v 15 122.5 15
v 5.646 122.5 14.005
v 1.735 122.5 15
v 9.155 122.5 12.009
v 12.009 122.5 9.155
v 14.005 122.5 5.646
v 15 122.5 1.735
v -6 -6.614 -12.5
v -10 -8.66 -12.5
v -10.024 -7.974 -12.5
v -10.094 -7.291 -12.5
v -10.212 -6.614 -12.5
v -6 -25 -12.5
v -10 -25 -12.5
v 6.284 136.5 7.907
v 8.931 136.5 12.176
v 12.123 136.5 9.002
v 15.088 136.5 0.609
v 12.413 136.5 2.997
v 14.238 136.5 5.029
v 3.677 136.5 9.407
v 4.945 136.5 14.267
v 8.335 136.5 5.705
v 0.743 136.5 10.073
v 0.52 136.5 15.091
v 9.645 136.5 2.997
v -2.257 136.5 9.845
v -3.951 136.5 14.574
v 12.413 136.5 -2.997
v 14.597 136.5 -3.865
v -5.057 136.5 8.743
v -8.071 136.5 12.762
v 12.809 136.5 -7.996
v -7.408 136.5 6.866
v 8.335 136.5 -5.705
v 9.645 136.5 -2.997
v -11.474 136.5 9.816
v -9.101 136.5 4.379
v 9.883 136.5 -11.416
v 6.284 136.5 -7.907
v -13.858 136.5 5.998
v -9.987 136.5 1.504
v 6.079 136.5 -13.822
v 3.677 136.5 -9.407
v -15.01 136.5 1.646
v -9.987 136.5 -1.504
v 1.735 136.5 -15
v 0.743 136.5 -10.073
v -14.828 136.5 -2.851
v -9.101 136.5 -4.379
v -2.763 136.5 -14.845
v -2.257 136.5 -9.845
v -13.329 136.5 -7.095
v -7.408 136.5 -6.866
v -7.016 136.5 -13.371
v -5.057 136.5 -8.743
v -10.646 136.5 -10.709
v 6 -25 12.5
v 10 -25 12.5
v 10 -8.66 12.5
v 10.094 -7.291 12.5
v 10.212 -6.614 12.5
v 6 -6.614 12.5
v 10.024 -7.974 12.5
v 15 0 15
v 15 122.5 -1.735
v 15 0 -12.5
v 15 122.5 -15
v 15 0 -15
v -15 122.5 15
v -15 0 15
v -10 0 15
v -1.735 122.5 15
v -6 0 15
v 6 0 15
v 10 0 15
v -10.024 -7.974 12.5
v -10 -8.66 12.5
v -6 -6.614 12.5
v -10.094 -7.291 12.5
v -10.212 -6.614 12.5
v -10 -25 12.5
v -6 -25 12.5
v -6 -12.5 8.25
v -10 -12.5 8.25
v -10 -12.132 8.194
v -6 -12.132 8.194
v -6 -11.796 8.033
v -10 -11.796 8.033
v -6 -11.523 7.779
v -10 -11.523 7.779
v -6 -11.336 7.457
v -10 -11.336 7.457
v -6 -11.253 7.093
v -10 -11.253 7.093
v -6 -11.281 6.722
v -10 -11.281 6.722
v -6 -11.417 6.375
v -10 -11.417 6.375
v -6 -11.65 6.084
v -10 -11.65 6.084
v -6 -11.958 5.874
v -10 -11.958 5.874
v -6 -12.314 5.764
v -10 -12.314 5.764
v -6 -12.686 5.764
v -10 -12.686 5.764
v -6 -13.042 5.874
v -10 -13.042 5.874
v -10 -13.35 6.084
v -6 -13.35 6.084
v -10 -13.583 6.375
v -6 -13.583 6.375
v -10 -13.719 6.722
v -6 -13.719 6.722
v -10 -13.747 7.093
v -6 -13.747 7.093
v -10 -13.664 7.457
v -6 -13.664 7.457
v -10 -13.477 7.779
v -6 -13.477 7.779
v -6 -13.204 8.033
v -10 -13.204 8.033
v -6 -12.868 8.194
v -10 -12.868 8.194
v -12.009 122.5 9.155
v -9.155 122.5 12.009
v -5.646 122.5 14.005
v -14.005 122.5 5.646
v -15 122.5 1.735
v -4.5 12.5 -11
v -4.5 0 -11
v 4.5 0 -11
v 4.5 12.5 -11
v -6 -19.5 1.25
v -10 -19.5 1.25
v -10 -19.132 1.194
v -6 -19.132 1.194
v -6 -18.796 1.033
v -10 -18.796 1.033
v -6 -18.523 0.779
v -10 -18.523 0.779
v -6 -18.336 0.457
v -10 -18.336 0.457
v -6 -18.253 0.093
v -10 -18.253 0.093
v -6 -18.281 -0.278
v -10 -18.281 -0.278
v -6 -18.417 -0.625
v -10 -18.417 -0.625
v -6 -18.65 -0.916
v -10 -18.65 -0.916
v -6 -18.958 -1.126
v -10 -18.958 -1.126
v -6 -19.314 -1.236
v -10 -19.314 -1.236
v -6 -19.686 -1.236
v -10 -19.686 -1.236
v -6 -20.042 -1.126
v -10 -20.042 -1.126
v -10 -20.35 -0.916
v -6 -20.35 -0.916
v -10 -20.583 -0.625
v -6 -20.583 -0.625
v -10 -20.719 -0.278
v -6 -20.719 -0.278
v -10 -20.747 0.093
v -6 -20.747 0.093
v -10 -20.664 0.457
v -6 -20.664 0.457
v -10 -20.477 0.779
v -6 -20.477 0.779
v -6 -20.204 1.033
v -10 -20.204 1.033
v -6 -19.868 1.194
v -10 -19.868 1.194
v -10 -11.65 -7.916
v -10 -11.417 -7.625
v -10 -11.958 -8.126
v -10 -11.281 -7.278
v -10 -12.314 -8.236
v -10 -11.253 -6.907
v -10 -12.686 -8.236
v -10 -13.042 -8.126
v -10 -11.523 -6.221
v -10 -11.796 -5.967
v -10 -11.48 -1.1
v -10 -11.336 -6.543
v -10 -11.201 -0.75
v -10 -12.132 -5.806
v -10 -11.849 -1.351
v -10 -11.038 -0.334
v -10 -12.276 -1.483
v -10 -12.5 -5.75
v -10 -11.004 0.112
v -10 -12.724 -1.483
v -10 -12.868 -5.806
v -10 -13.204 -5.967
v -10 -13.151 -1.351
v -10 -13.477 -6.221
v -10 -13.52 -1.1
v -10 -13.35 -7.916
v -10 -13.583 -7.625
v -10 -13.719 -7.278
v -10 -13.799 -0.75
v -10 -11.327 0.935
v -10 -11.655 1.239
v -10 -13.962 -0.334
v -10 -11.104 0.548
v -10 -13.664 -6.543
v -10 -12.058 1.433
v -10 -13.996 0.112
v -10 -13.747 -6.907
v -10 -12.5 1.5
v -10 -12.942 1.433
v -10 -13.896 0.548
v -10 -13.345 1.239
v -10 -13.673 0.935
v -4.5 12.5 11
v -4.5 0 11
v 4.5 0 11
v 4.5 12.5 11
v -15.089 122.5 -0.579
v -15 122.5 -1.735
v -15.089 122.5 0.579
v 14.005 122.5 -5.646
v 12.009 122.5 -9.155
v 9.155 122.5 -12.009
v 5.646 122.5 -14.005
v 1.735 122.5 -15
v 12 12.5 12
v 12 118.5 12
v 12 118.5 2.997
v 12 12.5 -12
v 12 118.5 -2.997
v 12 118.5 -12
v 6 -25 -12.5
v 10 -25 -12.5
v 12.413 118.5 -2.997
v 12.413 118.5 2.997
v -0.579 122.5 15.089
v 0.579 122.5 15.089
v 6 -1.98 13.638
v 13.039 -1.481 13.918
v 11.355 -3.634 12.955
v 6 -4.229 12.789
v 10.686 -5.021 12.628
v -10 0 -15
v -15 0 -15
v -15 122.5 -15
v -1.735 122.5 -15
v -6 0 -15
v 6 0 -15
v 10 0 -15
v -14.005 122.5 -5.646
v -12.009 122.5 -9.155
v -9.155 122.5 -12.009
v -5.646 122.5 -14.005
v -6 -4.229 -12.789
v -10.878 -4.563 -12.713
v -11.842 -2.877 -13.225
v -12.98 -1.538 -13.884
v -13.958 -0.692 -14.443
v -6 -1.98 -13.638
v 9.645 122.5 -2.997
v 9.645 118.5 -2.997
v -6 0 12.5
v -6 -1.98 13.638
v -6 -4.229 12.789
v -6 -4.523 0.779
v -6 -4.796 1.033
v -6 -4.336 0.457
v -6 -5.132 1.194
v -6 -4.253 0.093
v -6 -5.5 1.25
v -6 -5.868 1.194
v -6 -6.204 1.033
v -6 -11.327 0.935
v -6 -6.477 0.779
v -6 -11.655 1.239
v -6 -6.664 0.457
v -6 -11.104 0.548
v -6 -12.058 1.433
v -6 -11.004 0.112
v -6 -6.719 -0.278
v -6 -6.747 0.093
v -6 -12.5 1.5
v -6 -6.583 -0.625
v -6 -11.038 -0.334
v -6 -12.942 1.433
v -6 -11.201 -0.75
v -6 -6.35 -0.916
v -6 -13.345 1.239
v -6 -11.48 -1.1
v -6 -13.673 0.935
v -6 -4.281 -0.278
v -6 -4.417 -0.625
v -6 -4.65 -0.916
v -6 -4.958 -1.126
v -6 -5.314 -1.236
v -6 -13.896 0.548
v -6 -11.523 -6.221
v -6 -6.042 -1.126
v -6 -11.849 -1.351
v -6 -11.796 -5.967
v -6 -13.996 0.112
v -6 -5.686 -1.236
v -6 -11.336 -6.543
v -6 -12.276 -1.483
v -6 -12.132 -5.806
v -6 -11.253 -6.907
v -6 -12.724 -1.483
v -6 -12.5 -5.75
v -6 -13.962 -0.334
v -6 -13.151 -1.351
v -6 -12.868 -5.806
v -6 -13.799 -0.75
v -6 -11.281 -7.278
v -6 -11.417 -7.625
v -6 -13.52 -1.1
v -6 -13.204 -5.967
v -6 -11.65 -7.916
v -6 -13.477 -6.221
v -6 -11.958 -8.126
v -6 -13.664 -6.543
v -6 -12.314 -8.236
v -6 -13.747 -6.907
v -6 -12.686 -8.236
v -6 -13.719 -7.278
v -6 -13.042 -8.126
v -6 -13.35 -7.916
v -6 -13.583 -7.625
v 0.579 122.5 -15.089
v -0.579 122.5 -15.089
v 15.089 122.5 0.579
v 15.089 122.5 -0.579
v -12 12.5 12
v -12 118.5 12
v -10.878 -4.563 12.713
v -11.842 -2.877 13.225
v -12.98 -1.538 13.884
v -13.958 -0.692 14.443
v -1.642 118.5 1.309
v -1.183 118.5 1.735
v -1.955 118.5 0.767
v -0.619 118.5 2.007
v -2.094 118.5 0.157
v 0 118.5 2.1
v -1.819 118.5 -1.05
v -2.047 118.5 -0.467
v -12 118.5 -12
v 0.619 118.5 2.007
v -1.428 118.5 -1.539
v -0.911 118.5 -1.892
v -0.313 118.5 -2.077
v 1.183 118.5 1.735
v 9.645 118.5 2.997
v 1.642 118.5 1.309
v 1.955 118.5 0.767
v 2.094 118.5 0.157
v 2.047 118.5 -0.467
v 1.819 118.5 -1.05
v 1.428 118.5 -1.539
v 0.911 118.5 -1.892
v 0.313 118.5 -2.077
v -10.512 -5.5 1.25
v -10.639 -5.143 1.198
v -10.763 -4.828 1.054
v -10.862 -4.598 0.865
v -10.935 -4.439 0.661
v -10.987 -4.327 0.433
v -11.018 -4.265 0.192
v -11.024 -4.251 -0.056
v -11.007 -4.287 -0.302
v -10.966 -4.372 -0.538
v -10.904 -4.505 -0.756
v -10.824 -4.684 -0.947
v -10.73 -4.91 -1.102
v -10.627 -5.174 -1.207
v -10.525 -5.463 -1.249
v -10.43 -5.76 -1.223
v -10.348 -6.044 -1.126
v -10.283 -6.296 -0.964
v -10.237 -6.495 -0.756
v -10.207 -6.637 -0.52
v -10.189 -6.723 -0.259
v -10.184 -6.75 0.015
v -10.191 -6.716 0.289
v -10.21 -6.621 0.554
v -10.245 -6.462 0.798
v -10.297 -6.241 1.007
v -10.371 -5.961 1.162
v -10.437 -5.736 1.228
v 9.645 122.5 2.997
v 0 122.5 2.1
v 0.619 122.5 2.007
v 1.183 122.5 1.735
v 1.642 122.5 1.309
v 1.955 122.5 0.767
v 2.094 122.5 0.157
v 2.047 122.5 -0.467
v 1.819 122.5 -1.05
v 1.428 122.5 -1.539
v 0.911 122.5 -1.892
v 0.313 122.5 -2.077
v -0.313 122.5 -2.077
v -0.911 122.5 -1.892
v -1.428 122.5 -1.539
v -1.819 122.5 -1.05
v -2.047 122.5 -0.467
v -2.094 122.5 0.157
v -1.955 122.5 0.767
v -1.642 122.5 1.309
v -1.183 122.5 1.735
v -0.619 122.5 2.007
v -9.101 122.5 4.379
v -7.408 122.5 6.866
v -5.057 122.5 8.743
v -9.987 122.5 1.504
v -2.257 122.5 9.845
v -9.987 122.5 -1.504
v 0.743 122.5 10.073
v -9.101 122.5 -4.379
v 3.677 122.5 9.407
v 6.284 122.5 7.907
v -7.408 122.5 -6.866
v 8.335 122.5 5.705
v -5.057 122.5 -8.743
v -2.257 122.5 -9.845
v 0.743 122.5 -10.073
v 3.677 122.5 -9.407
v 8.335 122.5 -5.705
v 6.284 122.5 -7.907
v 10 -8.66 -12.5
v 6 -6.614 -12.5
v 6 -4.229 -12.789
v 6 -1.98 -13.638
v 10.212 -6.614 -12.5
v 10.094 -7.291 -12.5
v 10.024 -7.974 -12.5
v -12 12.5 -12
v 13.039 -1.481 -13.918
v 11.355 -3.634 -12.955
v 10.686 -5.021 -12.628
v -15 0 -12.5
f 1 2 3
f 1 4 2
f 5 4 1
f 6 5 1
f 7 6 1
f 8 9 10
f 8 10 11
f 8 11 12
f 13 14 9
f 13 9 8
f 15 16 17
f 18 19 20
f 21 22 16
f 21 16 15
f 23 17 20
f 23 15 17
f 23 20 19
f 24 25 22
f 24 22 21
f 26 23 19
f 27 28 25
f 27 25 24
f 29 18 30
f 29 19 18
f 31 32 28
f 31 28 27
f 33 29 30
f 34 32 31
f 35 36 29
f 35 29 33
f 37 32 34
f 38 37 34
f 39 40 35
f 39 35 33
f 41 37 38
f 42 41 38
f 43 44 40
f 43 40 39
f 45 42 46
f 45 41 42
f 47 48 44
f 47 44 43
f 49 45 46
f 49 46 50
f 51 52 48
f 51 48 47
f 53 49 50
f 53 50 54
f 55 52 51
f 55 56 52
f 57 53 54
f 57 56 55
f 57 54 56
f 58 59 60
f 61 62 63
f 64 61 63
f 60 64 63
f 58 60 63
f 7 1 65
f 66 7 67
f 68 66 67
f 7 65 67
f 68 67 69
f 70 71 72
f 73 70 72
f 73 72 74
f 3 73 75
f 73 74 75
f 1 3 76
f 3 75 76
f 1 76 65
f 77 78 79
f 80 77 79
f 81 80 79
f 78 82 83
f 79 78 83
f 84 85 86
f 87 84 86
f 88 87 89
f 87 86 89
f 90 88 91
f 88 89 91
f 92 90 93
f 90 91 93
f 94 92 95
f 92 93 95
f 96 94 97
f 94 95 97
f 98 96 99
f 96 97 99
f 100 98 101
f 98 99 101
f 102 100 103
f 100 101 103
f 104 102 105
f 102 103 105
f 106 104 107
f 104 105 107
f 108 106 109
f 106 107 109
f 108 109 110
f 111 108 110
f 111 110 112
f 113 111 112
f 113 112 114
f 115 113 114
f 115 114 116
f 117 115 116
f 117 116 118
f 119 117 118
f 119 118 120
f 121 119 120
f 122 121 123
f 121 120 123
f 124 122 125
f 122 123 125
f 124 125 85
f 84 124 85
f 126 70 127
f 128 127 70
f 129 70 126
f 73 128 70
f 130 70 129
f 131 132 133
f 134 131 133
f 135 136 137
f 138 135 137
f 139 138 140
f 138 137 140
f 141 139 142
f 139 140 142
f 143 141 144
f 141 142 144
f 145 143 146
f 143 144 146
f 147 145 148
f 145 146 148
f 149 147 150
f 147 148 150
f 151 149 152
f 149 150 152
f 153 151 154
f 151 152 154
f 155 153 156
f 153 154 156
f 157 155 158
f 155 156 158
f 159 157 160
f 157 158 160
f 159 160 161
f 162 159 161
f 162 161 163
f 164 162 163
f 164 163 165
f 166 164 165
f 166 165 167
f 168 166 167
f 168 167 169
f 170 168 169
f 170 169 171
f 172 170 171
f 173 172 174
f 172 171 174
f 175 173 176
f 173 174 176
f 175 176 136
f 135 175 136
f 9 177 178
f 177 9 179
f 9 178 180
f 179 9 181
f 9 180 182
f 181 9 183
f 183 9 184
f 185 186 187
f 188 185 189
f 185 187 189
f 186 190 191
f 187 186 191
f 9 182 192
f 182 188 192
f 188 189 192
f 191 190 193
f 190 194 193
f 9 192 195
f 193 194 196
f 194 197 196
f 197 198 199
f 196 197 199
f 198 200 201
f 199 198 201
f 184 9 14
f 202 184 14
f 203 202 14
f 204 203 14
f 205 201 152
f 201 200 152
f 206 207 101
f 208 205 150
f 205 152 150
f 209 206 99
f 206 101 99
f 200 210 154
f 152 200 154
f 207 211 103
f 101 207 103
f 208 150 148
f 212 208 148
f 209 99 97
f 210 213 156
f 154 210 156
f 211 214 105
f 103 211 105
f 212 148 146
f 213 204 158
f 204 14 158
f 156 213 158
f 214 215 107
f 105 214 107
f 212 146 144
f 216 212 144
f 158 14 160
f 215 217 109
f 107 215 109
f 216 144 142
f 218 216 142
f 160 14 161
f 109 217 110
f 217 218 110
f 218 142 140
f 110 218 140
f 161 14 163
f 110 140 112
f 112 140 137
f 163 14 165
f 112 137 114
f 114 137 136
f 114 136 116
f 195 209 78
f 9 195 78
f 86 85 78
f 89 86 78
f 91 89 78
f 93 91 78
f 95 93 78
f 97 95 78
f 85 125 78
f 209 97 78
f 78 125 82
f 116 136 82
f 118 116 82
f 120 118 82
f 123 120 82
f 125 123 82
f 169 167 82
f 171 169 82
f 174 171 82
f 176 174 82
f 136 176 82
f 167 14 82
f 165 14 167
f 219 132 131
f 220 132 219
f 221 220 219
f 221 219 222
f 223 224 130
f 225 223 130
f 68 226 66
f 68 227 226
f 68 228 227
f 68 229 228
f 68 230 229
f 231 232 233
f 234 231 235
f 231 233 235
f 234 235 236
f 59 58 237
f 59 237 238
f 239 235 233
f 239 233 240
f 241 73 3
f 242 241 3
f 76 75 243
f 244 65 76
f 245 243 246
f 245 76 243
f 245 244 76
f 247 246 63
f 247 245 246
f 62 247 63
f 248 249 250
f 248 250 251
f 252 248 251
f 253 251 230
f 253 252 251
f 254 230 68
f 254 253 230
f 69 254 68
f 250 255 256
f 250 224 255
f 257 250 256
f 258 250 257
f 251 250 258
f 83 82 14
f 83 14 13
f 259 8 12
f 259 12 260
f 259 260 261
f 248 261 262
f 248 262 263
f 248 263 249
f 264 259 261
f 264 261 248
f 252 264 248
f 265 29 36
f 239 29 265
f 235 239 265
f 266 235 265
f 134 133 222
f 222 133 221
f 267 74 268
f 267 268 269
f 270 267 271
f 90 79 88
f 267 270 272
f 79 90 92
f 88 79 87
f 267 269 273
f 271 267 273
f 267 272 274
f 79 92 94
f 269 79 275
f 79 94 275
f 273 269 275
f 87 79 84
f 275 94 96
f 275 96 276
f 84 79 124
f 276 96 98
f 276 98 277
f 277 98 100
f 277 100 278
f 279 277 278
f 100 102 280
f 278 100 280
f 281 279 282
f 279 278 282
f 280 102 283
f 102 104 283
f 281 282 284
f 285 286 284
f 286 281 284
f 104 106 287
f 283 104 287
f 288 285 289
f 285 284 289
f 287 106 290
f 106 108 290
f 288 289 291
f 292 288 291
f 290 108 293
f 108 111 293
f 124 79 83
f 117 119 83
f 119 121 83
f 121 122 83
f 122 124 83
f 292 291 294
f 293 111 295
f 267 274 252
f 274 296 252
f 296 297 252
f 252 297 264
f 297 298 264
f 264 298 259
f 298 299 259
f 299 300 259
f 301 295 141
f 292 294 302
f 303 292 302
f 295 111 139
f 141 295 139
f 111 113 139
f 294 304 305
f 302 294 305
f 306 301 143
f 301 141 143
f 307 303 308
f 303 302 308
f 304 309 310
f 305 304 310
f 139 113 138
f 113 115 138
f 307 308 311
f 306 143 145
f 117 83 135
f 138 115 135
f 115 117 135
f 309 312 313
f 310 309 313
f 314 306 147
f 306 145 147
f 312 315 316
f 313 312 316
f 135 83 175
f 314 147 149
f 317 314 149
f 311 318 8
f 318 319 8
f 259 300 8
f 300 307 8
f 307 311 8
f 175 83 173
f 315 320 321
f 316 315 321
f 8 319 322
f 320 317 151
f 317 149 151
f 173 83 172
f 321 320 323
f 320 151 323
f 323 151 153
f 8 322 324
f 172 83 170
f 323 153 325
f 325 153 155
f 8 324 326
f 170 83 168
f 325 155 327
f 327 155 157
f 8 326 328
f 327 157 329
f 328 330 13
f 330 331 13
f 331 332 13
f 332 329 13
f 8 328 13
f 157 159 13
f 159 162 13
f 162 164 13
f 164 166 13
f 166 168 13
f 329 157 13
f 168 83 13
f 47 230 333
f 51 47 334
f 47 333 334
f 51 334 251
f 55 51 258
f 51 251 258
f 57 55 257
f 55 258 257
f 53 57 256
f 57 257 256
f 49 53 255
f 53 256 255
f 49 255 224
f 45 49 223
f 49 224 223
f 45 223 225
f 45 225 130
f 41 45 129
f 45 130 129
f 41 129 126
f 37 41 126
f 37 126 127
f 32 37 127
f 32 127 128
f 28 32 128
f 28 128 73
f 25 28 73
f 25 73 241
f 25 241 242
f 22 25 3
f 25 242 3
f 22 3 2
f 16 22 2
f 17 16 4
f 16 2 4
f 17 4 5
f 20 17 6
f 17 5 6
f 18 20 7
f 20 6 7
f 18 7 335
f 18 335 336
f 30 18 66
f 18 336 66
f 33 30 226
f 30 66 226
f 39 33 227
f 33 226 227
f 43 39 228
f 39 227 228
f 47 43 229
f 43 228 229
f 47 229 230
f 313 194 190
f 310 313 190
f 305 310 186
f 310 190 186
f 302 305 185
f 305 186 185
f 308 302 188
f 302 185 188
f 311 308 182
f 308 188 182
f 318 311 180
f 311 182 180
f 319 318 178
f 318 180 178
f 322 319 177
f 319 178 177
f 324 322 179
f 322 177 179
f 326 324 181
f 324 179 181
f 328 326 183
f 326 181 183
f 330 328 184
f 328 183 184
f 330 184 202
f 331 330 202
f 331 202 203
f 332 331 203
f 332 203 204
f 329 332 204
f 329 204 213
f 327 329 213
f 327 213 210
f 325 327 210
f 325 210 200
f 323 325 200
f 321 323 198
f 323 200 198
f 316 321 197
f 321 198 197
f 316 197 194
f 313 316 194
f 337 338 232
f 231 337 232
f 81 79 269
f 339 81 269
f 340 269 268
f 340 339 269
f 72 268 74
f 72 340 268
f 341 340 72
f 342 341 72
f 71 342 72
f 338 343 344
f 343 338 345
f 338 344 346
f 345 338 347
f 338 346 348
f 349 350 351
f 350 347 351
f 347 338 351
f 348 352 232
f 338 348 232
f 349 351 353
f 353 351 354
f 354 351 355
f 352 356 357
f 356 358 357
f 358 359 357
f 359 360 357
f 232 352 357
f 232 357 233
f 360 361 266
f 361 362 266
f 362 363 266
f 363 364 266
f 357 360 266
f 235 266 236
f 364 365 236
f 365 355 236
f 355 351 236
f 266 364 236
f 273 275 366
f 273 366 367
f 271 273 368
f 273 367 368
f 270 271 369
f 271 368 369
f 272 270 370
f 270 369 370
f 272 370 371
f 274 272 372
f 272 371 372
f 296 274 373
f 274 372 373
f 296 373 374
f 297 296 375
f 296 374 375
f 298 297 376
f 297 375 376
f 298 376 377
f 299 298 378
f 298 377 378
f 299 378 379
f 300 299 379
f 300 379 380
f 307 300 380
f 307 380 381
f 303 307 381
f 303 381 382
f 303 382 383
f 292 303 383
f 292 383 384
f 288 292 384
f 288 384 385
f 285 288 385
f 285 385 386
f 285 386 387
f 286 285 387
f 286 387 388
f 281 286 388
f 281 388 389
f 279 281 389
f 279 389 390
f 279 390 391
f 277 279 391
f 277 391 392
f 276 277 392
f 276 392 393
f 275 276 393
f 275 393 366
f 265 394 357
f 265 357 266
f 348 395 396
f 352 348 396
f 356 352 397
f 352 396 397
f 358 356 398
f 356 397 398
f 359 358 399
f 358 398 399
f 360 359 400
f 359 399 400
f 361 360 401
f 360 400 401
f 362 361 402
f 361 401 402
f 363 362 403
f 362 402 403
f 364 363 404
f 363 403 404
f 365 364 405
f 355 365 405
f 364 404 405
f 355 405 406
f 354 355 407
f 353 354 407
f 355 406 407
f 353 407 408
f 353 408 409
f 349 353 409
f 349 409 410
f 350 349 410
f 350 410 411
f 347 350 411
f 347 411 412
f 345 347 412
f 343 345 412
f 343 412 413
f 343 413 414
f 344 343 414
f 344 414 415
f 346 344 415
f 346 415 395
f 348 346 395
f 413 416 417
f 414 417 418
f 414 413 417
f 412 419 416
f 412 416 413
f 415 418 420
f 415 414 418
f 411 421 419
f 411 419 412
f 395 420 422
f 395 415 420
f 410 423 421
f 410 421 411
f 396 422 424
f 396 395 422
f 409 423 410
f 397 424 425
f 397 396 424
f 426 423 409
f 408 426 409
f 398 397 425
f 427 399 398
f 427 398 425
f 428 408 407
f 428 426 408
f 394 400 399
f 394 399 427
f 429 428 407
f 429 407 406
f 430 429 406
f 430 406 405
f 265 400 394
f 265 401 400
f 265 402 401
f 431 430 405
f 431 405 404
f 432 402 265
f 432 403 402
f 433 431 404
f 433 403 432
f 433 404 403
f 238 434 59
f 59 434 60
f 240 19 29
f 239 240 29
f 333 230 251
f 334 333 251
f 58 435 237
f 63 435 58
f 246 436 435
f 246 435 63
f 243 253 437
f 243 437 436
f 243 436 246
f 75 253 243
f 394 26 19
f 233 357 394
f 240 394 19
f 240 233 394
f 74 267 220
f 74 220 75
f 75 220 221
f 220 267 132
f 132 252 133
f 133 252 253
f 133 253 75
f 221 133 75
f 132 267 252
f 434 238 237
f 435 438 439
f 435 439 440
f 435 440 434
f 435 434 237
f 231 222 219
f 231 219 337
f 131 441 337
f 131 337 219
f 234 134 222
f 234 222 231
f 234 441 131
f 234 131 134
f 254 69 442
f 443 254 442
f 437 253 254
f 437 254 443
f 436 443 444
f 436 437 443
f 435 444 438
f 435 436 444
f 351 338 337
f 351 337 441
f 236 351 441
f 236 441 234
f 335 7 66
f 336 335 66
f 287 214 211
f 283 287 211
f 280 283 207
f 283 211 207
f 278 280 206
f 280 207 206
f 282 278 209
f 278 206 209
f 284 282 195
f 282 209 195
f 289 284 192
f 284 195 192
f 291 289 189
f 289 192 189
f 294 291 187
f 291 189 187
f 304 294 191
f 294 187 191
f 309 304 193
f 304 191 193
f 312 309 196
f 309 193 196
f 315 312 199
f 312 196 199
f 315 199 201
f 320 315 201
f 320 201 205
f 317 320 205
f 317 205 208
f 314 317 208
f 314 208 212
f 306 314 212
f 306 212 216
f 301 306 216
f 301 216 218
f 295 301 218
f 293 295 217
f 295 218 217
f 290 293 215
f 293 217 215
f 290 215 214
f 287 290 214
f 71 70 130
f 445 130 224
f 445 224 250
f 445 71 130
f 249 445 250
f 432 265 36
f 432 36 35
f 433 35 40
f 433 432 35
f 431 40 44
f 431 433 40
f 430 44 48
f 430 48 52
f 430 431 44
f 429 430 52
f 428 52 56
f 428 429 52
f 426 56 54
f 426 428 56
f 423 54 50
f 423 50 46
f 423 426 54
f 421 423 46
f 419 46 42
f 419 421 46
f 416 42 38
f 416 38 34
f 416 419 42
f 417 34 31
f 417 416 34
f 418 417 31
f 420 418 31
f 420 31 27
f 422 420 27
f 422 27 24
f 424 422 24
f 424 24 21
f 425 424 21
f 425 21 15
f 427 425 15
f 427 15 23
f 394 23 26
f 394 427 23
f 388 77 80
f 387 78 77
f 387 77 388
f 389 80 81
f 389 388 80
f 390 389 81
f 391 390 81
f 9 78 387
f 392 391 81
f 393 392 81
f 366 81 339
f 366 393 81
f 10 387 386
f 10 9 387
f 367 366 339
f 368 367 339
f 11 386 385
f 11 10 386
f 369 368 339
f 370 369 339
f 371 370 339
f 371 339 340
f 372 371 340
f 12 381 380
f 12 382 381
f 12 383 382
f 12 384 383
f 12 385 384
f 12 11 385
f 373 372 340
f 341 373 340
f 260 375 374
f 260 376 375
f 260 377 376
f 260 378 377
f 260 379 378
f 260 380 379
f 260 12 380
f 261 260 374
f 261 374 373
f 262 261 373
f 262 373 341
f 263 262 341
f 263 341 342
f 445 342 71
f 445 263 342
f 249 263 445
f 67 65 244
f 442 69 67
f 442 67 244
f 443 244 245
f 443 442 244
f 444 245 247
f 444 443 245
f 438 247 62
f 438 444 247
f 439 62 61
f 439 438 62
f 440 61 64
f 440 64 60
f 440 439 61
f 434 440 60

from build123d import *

# Parameters (mm, degrees)
SKETCH1_W           = 30
SKETCH1_H           = 30
BOSS_EXTRUDE1_DEPTH = 122.5
SKETCH2_W           = 4
SKETCH2_H           = 25
BOSS_EXTRUDE2_DEPTH = 25
SKETCH3_W           = 24
SKETCH3_H           = 24
CUT_EXTRUDE1_DEPTH  = 110
SKETCH5_W           = 24
SKETCH5_H           = 24
BOSS_EXTRUDE4_DEPTH = 4
SKETCH4_R           = 15.1
BOSS_EXTRUDE3_DEPTH = 14
SKETCH7_W           = 2.767549144
SKETCH7_H           = 5.993795478
CUT_EXTRUDE3_DEPTH  = 4
SKETCH12_R          = 2.1
CUT_EXTRUDE6_DEPTH  = 150.037813994
SKETCH13_W          = 9
SKETCH13_H          = 22
CUT_EXTRUDE7_DEPTH  = 20
SKETCH8_R           = 1.25
SKETCH8_R_2         = 1.5
CUT_EXTRUDE4_DEPTH  = 4
FILLET1_R           = 10


with BuildPart() as part:
    # Sketch1 → Boss-Extrude1 (new body)
    with BuildSketch(Plane(origin=(0, 0, 0), x_dir=(1, 0, 0), z_dir=(0, 1, 0))):
        Rectangle(SKETCH1_W, SKETCH1_H)
    extrude(amount=BOSS_EXTRUDE1_DEPTH)

    # Sketch2 → Boss-Extrude2 (add)
    with BuildSketch(Plane.XZ):
        with Locations((-8, 0)):
            Rectangle(SKETCH2_W, SKETCH2_H)
        with Locations((8, 0)):
            Rectangle(SKETCH2_W, SKETCH2_H)
    extrude(amount=BOSS_EXTRUDE2_DEPTH)

    # Sketch3 → Cut-Extrude1 (cut)
    with BuildSketch(Plane(origin=(0, 122.5, 0), x_dir=(1, 0, 0), z_dir=(0, 1, 0))):
        Rectangle(SKETCH3_W, SKETCH3_H)
    extrude(amount=-CUT_EXTRUDE1_DEPTH, mode=Mode.SUBTRACT)

    # Sketch5 → Boss-Extrude4 (add)
    with BuildSketch(Plane(origin=(0, 122.5, 0), x_dir=(1, 0, 0), z_dir=(0, 1, 0))):
        Rectangle(SKETCH5_W, SKETCH5_H)
    extrude(amount=-BOSS_EXTRUDE4_DEPTH)

    # Sketch4 → Boss-Extrude3 (add)
    with BuildSketch(Plane(origin=(0, 122.5, 0), x_dir=(1, 0, 0), z_dir=(0, 1, 0))):
        with Locations(Location((0, 0, 0), (0, 0, 83.402352246))):
            Circle(SKETCH4_R)
        with BuildLine():
            Line((12.412682836, -2.996897739), (12.412682836, 2.996897739))
            Line((12.412682836, 2.996897739), (9.645133692, 2.996897739))
            ThreePointArc((9.645133692, 2.996897739), (-10.1, 0), (9.645133692, -2.996897739))
            Line((9.645133692, -2.996897739), (12.412682836, -2.996897739))
        make_face(mode=Mode.SUBTRACT)
    extrude(amount=BOSS_EXTRUDE3_DEPTH)

    # Sketch7 → Cut-Extrude3 (cut)
    with BuildSketch(Plane(origin=(0, 122.5, 0), x_dir=(1, 0, 0), z_dir=(0, 1, 0))):
        with Locations((11.028908264, 0)):
            Rectangle(SKETCH7_W, SKETCH7_H)
    extrude(amount=-CUT_EXTRUDE3_DEPTH, mode=Mode.SUBTRACT)

    # Sketch12 → Cut-Extrude6 (cut, through all)
    with BuildSketch(Plane(origin=(0, 122.5, 0), x_dir=(1, 0, 0), z_dir=(0, 1, 0))):
        with Locations(Location((0, 0, 0), (0, 0, 270))):
            Circle(SKETCH12_R)
    extrude(amount=-CUT_EXTRUDE6_DEPTH, mode=Mode.SUBTRACT)

    # Sketch13 → Cut-Extrude7 (cut)
    with BuildSketch(Plane.XZ):
        Rectangle(SKETCH13_W, SKETCH13_H)
    extrude(amount=-CUT_EXTRUDE7_DEPTH, mode=Mode.SUBTRACT)

    # Sketch8 → Cut-Extrude4 (cut)
    with BuildSketch(Plane.ZY.offset(10)):
        with Locations((0, -5.5)):
            Circle(SKETCH8_R)
        with Locations((7, -12.5)):
            Circle(SKETCH8_R)
        with Locations((0, -19.5)):
            Circle(SKETCH8_R)
        with Locations((-7, -12.5)):
            Circle(SKETCH8_R)
        with Locations((0, -12.5)):
            Circle(SKETCH8_R_2)
    extrude(amount=-CUT_EXTRUDE4_DEPTH, mode=Mode.SUBTRACT)

    # Fillet1
    # the kernel refuses this fillet: 10 mm, written as the material it adds along each edge
    with BuildSketch(Plane(origin=(-10.535945694, 0, -12.5), x_dir=(0, 0, -1), z_dir=(1, 0, 0))) as fillet1_piece_1_section:
        with BuildLine():
            CenterArc((10, -6.614378278), FILLET1_R, 138.590377891, 41.409622109)
            Line((0, -6.614378278), (-0.2, -6.614378278))
            Line((-0.2, -6.614378278), (-0.2, 0))
            Line((-0.2, 0), (0, 0.2))
            ThreePointArc((0, 0.2), (1.25, 0.2), (2.35, 0.132287566))
            Line((2.35, 0.132287566), (2.5, 0))
        make_face()
    fillet1_piece_1 = extrude(amount=20.535945694, mode=Mode.PRIVATE)
    fillet1_piece_1 = split(fillet1_piece_1, bisect_by=Plane(origin=(-10, -1.814075663, -13.097749904), z_dir=(1, 0, 0)), keep=Keep.TOP, mode=Mode.PRIVATE)
    fillet1_piece_1 = split(fillet1_piece_1, bisect_by=Plane(origin=(-6, -1.814075663, -13.097749904), z_dir=(-1, 0, 0)), keep=Keep.TOP, mode=Mode.PRIVATE)
    add(fillet1_piece_1)
    with BuildSketch(Plane(origin=(6, 0, -12.5), x_dir=(0, 0, -1), z_dir=(1, 0, 0)), Plane(origin=(10, 0, 12.5), x_dir=(0, 0, 1), z_dir=(-1, 0, 0))) as fillet1_piece_2:
        with BuildLine():
            CenterArc((10, -6.614378278), FILLET1_R, 138.590377891, 41.409622109)
            Line((0, -6.614378278), (-0.2, -6.614378278))
            Line((-0.2, -6.614378278), (-0.2, 0))
            Line((-0.2, 0), (0, 0.2))
            ThreePointArc((0, 0.2), (1.25, 0.2), (2.35, 0.132287566))
            Line((2.35, 0.132287566), (2.5, 0))
        make_face()
    extrude(amount=4)
    with BuildSketch(Plane(origin=(10, 0, -12.5), x_dir=(1, 0, 0), z_dir=(0, 0, 1))) as fillet1_piece_3:
        with BuildLine():
            CenterArc((10, -8.660254038), FILLET1_R, 120, 60)
            Line((0, -8.660254038), (-0.2, -8.660254038))
            Line((-0.2, -8.660254038), (-0.2, 0))
            Line((-0.2, 0), (0, 0.2))
            ThreePointArc((0, 0.2), (2.5, 0.2), (4.9, 0.173205081))
            Line((4.9, 0.173205081), (5, 0))
        make_face()
    extrude(amount=25)
    with BuildSketch(Plane(origin=(10, 0, 12.5), x_dir=(0, 0, 1), z_dir=(-1, 0, 0))) as fillet1_piece_4_section:
        with BuildLine():
            CenterArc((10, -6.614378278), FILLET1_R, 138.590377891, 41.409622109)
            Line((0, -6.614378278), (-0.2, -6.614378278))
            Line((-0.2, -6.614378278), (-0.2, 0))
            Line((-0.2, 0), (0, 0.2))
            ThreePointArc((0, 0.2), (1.25, 0.2), (2.35, 0.132287566))
            Line((2.35, 0.132287566), (2.5, 0))
        make_face()
    fillet1_piece_4 = extrude(amount=20.535945694, mode=Mode.PRIVATE)
    fillet1_piece_4 = split(fillet1_piece_4, bisect_by=Plane(origin=(-10, -1.814075663, 13.097749904), z_dir=(1, 0, 0)), keep=Keep.TOP, mode=Mode.PRIVATE)
    fillet1_piece_4 = split(fillet1_piece_4, bisect_by=Plane(origin=(-6, -1.814075663, 13.097749904), z_dir=(-1, 0, 0)), keep=Keep.TOP, mode=Mode.PRIVATE)
    add(fillet1_piece_4)
    with BuildSketch(Plane(origin=(-10, 0, 12.5), x_dir=(0, 0, 1), z_dir=(1, 0, 0)), Plane(origin=(-6, 0, -12.5), x_dir=(0, 0, -1), z_dir=(-1, 0, 0))) as fillet1_piece_5:
        with BuildLine():
            CenterArc((10, 6.614378278), FILLET1_R, 180, 41.409622109)
            Line((0, 6.614378278), (-0.2, 6.614378278))
            Line((-0.2, 6.614378278), (-0.2, 0))
            Line((-0.2, 0), (0, -0.2))
            ThreePointArc((0, -0.2), (1.25, -0.2), (2.35, -0.132287566))
            Line((2.35, -0.132287566), (2.5, 0))
        make_face()
    extrude(amount=4)
    with BuildSketch(Plane(origin=(-10, 0, 12.5), x_dir=(0, 0, 1), z_dir=(1, 0, 0))) as fillet1_piece_6_section:
        with BuildLine():
            CenterArc((10, 6.614378278), FILLET1_R, 180, 41.409622109)
            Line((0, 6.614378278), (-0.2, 6.614378278))
            Line((-0.2, 6.614378278), (-0.2, 0))
            Line((-0.2, 0), (0, -0.2))
            ThreePointArc((0, -0.2), (1.25, -0.2), (2.35, -0.132287566))
            Line((2.35, -0.132287566), (2.5, 0))
        make_face()
    fillet1_piece_6 = extrude(amount=20.535945694, mode=Mode.PRIVATE)
    fillet1_piece_6 = split(fillet1_piece_6, bisect_by=Plane(origin=(6, -1.814075663, 13.097749904), z_dir=(1, 0, 0)), keep=Keep.TOP, mode=Mode.PRIVATE)
    fillet1_piece_6 = split(fillet1_piece_6, bisect_by=Plane(origin=(10, -1.814075663, 13.097749904), z_dir=(-1, 0, 0)), keep=Keep.TOP, mode=Mode.PRIVATE)
    add(fillet1_piece_6)
    with BuildSketch(Plane(origin=(-10, 0, -12.5), x_dir=(-1, 0, 0), z_dir=(0, 0, 1))) as fillet1_piece_7_section:
        with BuildLine():
            CenterArc((10, 8.660254038), FILLET1_R, 180, 60)
            Line((0, 8.660254038), (-0.2, 8.660254038))
            Line((-0.2, 8.660254038), (-0.2, 0))
            Line((-0.2, 0), (0, -0.2))
            ThreePointArc((0, -0.2), (2.5, -0.2), (4.9, -0.173205081))
            Line((4.9, -0.173205081), (5, 0))
        make_face()
    fillet1_piece_7 = extrude(amount=25, mode=Mode.PRIVATE)
    fillet1_piece_7 = fillet1_piece_7 - Plane(origin=(-11.30561436, -5.5, 0), x_dir=(0, 0, 1), z_dir=(-1, 0, 0)) * Cylinder(1.25, 85, mode=Mode.PRIVATE)
    add(fillet1_piece_7)
    with BuildSketch(Plane(origin=(10.535945694, 0, -12.5), x_dir=(0, 0, -1), z_dir=(-1, 0, 0))) as fillet1_piece_8_section:
        with BuildLine():
            CenterArc((10, 6.614378278), FILLET1_R, 180, 41.409622109)
            Line((0, 6.614378278), (-0.2, 6.614378278))
            Line((-0.2, 6.614378278), (-0.2, 0))
            Line((-0.2, 0), (0, -0.2))
            ThreePointArc((0, -0.2), (1.25, -0.2), (2.35, -0.132287566))
            Line((2.35, -0.132287566), (2.5, 0))
        make_face()
    fillet1_piece_8 = extrude(amount=20.535945694, mode=Mode.PRIVATE)
    fillet1_piece_8 = split(fillet1_piece_8, bisect_by=Plane(origin=(6, -1.814075663, -13.097749904), z_dir=(1, 0, 0)), keep=Keep.TOP, mode=Mode.PRIVATE)
    fillet1_piece_8 = split(fillet1_piece_8, bisect_by=Plane(origin=(10, -1.814075663, -13.097749904), z_dir=(-1, 0, 0)), keep=Keep.TOP, mode=Mode.PRIVATE)
    add(fillet1_piece_8)
    with BuildSketch(Plane(origin=(6, 0, -12.5), x_dir=(0, 0, -1), z_dir=(1, 0, 0))) as fillet1_piece_9a_section:
        with BuildLine():
            CenterArc((10, -6.614378278), FILLET1_R, 138.590377891, 41.409622109)
            Line((0, -6.614378278), (-0.2, -6.614378278))
            Line((-0.2, -6.614378278), (-0.2, 0))
            Line((-0.2, 0), (0, 0.2))
            ThreePointArc((0, 0.2), (1.25, 0.2), (2.35, 0.132287566))
            Line((2.35, 0.132287566), (2.5, 0))
        make_face()
    fillet1_piece_9a = extrude(amount=20.535945694, mode=Mode.PRIVATE)
    fillet1_piece_9a = split(fillet1_piece_9a, bisect_by=Plane(origin=(15, -1.814075663, -13.097749904), z_dir=(-1, 0, 0)), keep=Keep.TOP, mode=Mode.PRIVATE)
    fillet1_piece_9a = split(fillet1_piece_9a, bisect_by=Plane(origin=(10, -1.814075663, -13.097749904), z_dir=(1, 0, 0)), keep=Keep.TOP, mode=Mode.PRIVATE)
    with BuildSketch(Plane(origin=(10, 0, -34.150635095), x_dir=(1, 0, 0), z_dir=(0, 0, 1))) as fillet1_piece_9b_section:
        with BuildLine():
            CenterArc((10, -8.660254038), FILLET1_R, 120, 60)
            Line((0, -8.660254038), (-0.2, -8.660254038))
            Line((-0.2, -8.660254038), (-0.2, 0))
            Line((-0.2, 0), (0, 0.2))
            ThreePointArc((0, 0.2), (2.5, 0.2), (4.9, 0.173205081))
            Line((4.9, 0.173205081), (5, 0))
        make_face()
    fillet1_piece_9b = extrude(amount=46.650635095, mode=Mode.PRIVATE)
    fillet1_piece_9b = split(fillet1_piece_9b, bisect_by=Plane(origin=(11.295167111, -2.163104458, -15), z_dir=(0, 0, 1)), keep=Keep.TOP, mode=Mode.PRIVATE)
    fillet1_piece_9b = split(fillet1_piece_9b, bisect_by=Plane(origin=(11.295167111, -2.163104458, -12.5), z_dir=(0, 0, -1)), keep=Keep.TOP, mode=Mode.PRIVATE)
    fillet1_piece_9 = fillet1_piece_9a & fillet1_piece_9b
    add(fillet1_piece_9)
    with BuildSketch(Plane(origin=(26.535945694, 0, 12.5), x_dir=(0, 0, 1), z_dir=(-1, 0, 0))) as fillet1_piece_10a_section:
        with BuildLine():
            CenterArc((10, -6.614378278), FILLET1_R, 138.590377891, 41.409622109)
            Line((0, -6.614378278), (-0.2, -6.614378278))
            Line((-0.2, -6.614378278), (-0.2, 0))
            Line((-0.2, 0), (0, 0.2))
            ThreePointArc((0, 0.2), (1.25, 0.2), (2.35, 0.132287566))
            Line((2.35, 0.132287566), (2.5, 0))
        make_face()
    fillet1_piece_10a = extrude(amount=20.535945694, mode=Mode.PRIVATE)
    fillet1_piece_10a = split(fillet1_piece_10a, bisect_by=Plane(origin=(15, -1.814075663, 13.097749904), z_dir=(-1, 0, 0)), keep=Keep.TOP, mode=Mode.PRIVATE)
    fillet1_piece_10a = split(fillet1_piece_10a, bisect_by=Plane(origin=(10, -1.814075663, 13.097749904), z_dir=(1, 0, 0)), keep=Keep.TOP, mode=Mode.PRIVATE)
    with BuildSketch(Plane(origin=(10, 0, -12.5), x_dir=(1, 0, 0), z_dir=(0, 0, 1))) as fillet1_piece_10b_section:
        with BuildLine():
            CenterArc((10, -8.660254038), FILLET1_R, 120, 60)
            Line((0, -8.660254038), (-0.2, -8.660254038))
            Line((-0.2, -8.660254038), (-0.2, 0))
            Line((-0.2, 0), (0, 0.2))
            ThreePointArc((0, 0.2), (2.5, 0.2), (4.9, 0.173205081))
            Line((4.9, 0.173205081), (5, 0))
        make_face()
    fillet1_piece_10b = extrude(amount=46.650635095, mode=Mode.PRIVATE)
    fillet1_piece_10b = split(fillet1_piece_10b, bisect_by=Plane(origin=(11.295167111, -2.163104458, 15), z_dir=(0, 0, -1)), keep=Keep.TOP, mode=Mode.PRIVATE)
    fillet1_piece_10b = split(fillet1_piece_10b, bisect_by=Plane(origin=(11.295167111, -2.163104458, 12.5), z_dir=(0, 0, 1)), keep=Keep.TOP, mode=Mode.PRIVATE)
    fillet1_piece_10 = fillet1_piece_10a & fillet1_piece_10b
    add(fillet1_piece_10)
    with BuildSketch(Plane(origin=(-10, 0, -12.5), x_dir=(-1, 0, 0), z_dir=(0, 0, 1))) as fillet1_piece_11a_section:
        with BuildLine():
            CenterArc((10, 8.660254038), FILLET1_R, 180, 60)
            Line((0, 8.660254038), (-0.2, 8.660254038))
            Line((-0.2, 8.660254038), (-0.2, 0))
            Line((-0.2, 0), (0, -0.2))
            ThreePointArc((0, -0.2), (2.5, -0.2), (4.9, -0.173205081))
            Line((4.9, -0.173205081), (5, 0))
        make_face()
    fillet1_piece_11a = extrude(amount=46.650635095, mode=Mode.PRIVATE)
    fillet1_piece_11a = split(fillet1_piece_11a, bisect_by=Plane(origin=(-11.295167111, -2.163104458, 15), z_dir=(0, 0, -1)), keep=Keep.TOP, mode=Mode.PRIVATE)
    fillet1_piece_11a = split(fillet1_piece_11a, bisect_by=Plane(origin=(-11.295167111, -2.163104458, 12.5), z_dir=(0, 0, 1)), keep=Keep.TOP, mode=Mode.PRIVATE)
    with BuildSketch(Plane(origin=(-26.535945694, 0, 12.5), x_dir=(0, 0, 1), z_dir=(1, 0, 0))) as fillet1_piece_11b_section:
        with BuildLine():
            CenterArc((10, 6.614378278), FILLET1_R, 180, 41.409622109)
            Line((0, 6.614378278), (-0.2, 6.614378278))
            Line((-0.2, 6.614378278), (-0.2, 0))
            Line((-0.2, 0), (0, -0.2))
            ThreePointArc((0, -0.2), (1.25, -0.2), (2.35, -0.132287566))
            Line((2.35, -0.132287566), (2.5, 0))
        make_face()
    fillet1_piece_11b = extrude(amount=20.535945694, mode=Mode.PRIVATE)
    fillet1_piece_11b = split(fillet1_piece_11b, bisect_by=Plane(origin=(-15, -1.814075663, 13.097749904), z_dir=(1, 0, 0)), keep=Keep.TOP, mode=Mode.PRIVATE)
    fillet1_piece_11b = split(fillet1_piece_11b, bisect_by=Plane(origin=(-10, -1.814075663, 13.097749904), z_dir=(-1, 0, 0)), keep=Keep.TOP, mode=Mode.PRIVATE)
    fillet1_piece_11 = fillet1_piece_11a & fillet1_piece_11b
    add(fillet1_piece_11)
    with BuildSketch(Plane(origin=(-10, 0, -34.150635095), x_dir=(-1, 0, 0), z_dir=(0, 0, 1))) as fillet1_piece_12a_section:
        with BuildLine():
            CenterArc((10, 8.660254038), FILLET1_R, 180, 60)
            Line((0, 8.660254038), (-0.2, 8.660254038))
            Line((-0.2, 8.660254038), (-0.2, 0))
            Line((-0.2, 0), (0, -0.2))
            ThreePointArc((0, -0.2), (2.5, -0.2), (4.9, -0.173205081))
            Line((4.9, -0.173205081), (5, 0))
        make_face()
    fillet1_piece_12a = extrude(amount=46.650635095, mode=Mode.PRIVATE)
    fillet1_piece_12a = split(fillet1_piece_12a, bisect_by=Plane(origin=(-11.295167111, -2.163104458, -15), z_dir=(0, 0, 1)), keep=Keep.TOP, mode=Mode.PRIVATE)
    fillet1_piece_12a = split(fillet1_piece_12a, bisect_by=Plane(origin=(-11.295167111, -2.163104458, -12.5), z_dir=(0, 0, -1)), keep=Keep.TOP, mode=Mode.PRIVATE)
    with BuildSketch(Plane(origin=(-6, 0, -12.5), x_dir=(0, 0, -1), z_dir=(-1, 0, 0))) as fillet1_piece_12b_section:
        with BuildLine():
            CenterArc((10, 6.614378278), FILLET1_R, 180, 41.409622109)
            Line((0, 6.614378278), (-0.2, 6.614378278))
            Line((-0.2, 6.614378278), (-0.2, 0))
            Line((-0.2, 0), (0, -0.2))
            ThreePointArc((0, -0.2), (1.25, -0.2), (2.35, -0.132287566))
            Line((2.35, -0.132287566), (2.5, 0))
        make_face()
    fillet1_piece_12b = extrude(amount=20.535945694, mode=Mode.PRIVATE)
    fillet1_piece_12b = split(fillet1_piece_12b, bisect_by=Plane(origin=(-15, -1.814075663, -13.097749904), z_dir=(1, 0, 0)), keep=Keep.TOP, mode=Mode.PRIVATE)
    fillet1_piece_12b = split(fillet1_piece_12b, bisect_by=Plane(origin=(-10, -1.814075663, -13.097749904), z_dir=(-1, 0, 0)), keep=Keep.TOP, mode=Mode.PRIVATE)
    fillet1_piece_12 = fillet1_piece_12a & fillet1_piece_12b
    add(fillet1_piece_12)


solid = part.part
